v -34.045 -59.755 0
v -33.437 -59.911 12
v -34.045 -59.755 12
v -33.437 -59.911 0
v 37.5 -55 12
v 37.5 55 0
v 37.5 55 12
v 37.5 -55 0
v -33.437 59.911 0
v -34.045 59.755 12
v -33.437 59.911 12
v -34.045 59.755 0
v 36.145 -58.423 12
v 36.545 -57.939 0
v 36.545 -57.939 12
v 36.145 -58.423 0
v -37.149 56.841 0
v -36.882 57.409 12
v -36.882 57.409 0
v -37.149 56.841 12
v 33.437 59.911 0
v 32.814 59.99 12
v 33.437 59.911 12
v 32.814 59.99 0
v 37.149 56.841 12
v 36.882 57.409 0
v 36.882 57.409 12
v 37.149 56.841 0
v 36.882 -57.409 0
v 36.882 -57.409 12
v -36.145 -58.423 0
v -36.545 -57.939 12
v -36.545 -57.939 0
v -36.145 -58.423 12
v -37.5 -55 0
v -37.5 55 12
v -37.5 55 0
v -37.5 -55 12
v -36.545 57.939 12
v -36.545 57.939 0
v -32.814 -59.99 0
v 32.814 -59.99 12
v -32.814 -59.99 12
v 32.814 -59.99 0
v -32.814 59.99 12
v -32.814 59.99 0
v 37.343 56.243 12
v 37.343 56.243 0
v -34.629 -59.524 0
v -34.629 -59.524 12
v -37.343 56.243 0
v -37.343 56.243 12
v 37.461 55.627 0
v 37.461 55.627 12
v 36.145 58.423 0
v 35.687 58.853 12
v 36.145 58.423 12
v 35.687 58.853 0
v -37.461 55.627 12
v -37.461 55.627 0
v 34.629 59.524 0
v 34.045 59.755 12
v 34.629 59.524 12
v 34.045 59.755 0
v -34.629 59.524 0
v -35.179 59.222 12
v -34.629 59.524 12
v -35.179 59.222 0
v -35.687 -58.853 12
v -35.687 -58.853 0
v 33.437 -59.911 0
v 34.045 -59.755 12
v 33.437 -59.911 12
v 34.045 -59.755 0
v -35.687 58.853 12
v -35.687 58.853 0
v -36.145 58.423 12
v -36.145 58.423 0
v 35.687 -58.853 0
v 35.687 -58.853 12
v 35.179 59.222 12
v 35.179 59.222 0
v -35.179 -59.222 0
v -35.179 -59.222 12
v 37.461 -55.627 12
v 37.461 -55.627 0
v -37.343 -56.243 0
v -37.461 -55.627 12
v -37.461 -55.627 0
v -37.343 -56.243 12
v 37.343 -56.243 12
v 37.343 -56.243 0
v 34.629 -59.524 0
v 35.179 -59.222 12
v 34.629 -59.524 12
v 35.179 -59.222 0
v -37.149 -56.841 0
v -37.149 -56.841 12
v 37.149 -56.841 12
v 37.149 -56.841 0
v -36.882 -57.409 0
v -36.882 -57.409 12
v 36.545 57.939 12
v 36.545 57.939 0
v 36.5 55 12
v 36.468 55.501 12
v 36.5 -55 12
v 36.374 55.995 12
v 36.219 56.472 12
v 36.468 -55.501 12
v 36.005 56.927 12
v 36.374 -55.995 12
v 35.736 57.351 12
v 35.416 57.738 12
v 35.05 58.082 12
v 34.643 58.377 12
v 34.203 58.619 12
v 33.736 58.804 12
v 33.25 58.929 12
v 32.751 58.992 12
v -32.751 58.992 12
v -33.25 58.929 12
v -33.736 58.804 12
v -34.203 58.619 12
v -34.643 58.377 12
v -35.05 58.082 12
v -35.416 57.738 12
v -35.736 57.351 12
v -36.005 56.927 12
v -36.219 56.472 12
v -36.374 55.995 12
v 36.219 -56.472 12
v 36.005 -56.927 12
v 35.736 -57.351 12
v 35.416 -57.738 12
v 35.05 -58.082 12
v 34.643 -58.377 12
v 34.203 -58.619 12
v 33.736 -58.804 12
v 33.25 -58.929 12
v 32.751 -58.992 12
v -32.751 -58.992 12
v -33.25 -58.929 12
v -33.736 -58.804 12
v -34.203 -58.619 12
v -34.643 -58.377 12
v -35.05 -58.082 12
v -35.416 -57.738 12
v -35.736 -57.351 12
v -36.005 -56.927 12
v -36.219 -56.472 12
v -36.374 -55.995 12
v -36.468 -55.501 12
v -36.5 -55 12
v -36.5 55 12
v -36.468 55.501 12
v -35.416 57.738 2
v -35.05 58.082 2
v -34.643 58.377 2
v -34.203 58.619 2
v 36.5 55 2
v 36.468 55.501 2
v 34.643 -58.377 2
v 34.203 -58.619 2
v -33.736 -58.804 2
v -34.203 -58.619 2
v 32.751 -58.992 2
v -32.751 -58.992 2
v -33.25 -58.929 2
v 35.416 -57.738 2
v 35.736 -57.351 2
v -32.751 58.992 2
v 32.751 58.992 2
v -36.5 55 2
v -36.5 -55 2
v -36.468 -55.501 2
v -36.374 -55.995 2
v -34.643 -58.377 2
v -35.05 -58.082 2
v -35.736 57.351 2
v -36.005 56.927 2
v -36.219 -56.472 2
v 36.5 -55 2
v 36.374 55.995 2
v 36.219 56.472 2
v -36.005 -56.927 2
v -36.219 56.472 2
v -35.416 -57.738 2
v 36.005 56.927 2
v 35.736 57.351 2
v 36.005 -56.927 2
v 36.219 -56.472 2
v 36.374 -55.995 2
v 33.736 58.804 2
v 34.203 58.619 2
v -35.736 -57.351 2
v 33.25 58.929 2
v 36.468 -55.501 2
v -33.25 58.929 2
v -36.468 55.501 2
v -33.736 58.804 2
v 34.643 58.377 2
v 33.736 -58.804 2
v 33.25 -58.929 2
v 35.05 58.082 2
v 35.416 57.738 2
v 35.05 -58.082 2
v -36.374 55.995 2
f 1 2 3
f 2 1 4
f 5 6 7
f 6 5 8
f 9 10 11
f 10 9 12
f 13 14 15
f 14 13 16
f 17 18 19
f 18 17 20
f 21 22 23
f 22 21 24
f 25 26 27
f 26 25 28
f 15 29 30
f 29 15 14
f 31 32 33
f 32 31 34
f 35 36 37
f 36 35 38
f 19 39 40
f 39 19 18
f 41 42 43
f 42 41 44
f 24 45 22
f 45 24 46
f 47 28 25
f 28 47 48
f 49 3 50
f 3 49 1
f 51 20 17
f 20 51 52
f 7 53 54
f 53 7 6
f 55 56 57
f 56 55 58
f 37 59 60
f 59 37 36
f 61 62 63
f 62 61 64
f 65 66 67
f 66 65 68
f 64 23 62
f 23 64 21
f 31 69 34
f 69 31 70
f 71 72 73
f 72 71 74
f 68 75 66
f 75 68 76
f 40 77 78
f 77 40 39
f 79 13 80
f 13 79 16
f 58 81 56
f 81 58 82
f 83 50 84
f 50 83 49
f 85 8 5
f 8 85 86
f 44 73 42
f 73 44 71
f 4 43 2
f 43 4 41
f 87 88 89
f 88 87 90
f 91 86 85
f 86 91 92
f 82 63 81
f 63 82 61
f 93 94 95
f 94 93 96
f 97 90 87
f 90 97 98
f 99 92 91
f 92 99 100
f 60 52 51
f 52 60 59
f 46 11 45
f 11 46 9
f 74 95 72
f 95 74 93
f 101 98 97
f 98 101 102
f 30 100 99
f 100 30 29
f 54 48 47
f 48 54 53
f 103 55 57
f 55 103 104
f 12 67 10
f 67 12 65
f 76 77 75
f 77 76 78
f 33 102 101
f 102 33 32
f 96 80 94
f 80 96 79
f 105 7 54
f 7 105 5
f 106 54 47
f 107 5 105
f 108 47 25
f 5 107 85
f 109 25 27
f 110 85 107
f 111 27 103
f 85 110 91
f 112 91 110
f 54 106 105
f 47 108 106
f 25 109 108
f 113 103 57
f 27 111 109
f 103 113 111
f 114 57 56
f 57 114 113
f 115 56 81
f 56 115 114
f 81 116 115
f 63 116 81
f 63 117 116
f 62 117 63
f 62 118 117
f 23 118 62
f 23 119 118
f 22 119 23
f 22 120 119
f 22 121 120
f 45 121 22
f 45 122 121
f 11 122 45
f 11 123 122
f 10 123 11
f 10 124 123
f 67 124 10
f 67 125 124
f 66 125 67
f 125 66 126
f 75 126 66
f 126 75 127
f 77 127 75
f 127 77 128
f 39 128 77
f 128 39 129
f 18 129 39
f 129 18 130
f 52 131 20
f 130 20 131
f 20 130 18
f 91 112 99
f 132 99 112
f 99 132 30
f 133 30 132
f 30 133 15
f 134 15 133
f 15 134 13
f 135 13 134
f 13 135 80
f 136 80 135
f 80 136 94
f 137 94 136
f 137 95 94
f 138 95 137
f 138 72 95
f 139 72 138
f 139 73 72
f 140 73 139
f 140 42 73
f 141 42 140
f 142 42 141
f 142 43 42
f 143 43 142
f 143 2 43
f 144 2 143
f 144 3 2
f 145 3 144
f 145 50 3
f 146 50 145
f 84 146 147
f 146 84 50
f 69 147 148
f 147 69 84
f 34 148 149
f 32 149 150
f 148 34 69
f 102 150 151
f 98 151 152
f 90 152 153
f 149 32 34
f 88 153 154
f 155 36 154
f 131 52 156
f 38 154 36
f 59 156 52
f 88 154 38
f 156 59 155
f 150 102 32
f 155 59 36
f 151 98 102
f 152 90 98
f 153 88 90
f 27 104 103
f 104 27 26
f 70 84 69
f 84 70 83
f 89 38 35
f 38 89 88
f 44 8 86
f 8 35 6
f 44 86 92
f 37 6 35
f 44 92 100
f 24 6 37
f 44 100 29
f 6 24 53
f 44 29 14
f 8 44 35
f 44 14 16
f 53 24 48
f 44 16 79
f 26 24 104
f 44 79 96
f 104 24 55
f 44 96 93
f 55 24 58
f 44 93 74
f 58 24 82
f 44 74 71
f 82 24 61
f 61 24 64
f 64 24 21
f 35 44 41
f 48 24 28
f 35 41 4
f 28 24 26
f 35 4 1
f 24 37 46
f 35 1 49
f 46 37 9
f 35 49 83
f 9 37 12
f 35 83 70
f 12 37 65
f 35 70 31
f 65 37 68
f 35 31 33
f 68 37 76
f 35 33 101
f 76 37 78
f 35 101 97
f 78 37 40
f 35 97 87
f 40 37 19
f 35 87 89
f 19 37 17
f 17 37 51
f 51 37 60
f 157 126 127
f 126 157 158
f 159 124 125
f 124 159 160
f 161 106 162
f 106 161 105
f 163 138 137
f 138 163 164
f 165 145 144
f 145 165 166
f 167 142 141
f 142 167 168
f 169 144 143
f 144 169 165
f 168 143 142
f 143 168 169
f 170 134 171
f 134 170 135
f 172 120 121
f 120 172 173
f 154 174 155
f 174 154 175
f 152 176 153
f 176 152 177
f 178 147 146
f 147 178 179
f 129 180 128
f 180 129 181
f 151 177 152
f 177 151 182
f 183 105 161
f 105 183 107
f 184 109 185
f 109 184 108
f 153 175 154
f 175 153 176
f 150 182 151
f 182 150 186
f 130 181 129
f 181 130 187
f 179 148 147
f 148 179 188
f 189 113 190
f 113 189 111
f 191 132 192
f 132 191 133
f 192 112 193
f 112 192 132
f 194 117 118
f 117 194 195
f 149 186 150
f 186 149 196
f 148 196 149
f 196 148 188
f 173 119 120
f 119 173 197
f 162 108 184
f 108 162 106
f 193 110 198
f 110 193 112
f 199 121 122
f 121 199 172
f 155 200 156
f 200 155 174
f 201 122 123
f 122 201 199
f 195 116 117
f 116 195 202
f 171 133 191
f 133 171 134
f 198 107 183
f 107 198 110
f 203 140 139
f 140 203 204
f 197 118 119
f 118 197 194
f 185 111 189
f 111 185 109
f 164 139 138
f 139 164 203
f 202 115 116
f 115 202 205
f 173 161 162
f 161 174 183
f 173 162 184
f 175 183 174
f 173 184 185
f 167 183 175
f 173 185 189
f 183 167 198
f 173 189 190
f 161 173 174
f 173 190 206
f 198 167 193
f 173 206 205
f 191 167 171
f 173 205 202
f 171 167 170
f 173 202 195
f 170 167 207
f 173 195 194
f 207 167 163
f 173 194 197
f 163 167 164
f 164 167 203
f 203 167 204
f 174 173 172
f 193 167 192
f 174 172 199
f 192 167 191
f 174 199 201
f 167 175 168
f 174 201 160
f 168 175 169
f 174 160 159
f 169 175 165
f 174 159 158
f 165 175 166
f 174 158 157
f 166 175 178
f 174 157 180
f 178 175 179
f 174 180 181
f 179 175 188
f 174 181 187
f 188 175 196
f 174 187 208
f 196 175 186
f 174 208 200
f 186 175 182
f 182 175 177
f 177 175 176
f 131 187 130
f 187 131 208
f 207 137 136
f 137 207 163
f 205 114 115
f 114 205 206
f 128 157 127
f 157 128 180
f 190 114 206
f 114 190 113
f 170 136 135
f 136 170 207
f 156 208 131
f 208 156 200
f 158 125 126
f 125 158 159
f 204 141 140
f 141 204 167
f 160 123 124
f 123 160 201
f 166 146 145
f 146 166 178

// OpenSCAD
$fn = 50;


difference() {
	union() {
		hull() {
			translate(v = [-32.5000000000, 55.0000000000, 0]) {
				cylinder(h = 12, r = 5);
			}
			translate(v = [32.5000000000, 55.0000000000, 0]) {
				cylinder(h = 12, r = 5);
			}
			translate(v = [-32.5000000000, -55.0000000000, 0]) {
				cylinder(h = 12, r = 5);
			}
			translate(v = [32.5000000000, -55.0000000000, 0]) {
				cylinder(h = 12, r = 5);
			}
		}
	}
	union() {
		translate(v = [0, 0, 2]) {
			hull() {
				translate(v = [-32.5000000000, 55.0000000000, 0]) {
					cylinder(h = 10, r = 4);
				}
				translate(v = [32.5000000000, 55.0000000000, 0]) {
					cylinder(h = 10, r = 4);
				}
				translate(v = [-32.5000000000, -55.0000000000, 0]) {
					cylinder(h = 10, r = 4);
				}
				translate(v = [32.5000000000, -55.0000000000, 0]) {
					cylinder(h = 10, r = 4);
				}
			}
		}
	}
}
